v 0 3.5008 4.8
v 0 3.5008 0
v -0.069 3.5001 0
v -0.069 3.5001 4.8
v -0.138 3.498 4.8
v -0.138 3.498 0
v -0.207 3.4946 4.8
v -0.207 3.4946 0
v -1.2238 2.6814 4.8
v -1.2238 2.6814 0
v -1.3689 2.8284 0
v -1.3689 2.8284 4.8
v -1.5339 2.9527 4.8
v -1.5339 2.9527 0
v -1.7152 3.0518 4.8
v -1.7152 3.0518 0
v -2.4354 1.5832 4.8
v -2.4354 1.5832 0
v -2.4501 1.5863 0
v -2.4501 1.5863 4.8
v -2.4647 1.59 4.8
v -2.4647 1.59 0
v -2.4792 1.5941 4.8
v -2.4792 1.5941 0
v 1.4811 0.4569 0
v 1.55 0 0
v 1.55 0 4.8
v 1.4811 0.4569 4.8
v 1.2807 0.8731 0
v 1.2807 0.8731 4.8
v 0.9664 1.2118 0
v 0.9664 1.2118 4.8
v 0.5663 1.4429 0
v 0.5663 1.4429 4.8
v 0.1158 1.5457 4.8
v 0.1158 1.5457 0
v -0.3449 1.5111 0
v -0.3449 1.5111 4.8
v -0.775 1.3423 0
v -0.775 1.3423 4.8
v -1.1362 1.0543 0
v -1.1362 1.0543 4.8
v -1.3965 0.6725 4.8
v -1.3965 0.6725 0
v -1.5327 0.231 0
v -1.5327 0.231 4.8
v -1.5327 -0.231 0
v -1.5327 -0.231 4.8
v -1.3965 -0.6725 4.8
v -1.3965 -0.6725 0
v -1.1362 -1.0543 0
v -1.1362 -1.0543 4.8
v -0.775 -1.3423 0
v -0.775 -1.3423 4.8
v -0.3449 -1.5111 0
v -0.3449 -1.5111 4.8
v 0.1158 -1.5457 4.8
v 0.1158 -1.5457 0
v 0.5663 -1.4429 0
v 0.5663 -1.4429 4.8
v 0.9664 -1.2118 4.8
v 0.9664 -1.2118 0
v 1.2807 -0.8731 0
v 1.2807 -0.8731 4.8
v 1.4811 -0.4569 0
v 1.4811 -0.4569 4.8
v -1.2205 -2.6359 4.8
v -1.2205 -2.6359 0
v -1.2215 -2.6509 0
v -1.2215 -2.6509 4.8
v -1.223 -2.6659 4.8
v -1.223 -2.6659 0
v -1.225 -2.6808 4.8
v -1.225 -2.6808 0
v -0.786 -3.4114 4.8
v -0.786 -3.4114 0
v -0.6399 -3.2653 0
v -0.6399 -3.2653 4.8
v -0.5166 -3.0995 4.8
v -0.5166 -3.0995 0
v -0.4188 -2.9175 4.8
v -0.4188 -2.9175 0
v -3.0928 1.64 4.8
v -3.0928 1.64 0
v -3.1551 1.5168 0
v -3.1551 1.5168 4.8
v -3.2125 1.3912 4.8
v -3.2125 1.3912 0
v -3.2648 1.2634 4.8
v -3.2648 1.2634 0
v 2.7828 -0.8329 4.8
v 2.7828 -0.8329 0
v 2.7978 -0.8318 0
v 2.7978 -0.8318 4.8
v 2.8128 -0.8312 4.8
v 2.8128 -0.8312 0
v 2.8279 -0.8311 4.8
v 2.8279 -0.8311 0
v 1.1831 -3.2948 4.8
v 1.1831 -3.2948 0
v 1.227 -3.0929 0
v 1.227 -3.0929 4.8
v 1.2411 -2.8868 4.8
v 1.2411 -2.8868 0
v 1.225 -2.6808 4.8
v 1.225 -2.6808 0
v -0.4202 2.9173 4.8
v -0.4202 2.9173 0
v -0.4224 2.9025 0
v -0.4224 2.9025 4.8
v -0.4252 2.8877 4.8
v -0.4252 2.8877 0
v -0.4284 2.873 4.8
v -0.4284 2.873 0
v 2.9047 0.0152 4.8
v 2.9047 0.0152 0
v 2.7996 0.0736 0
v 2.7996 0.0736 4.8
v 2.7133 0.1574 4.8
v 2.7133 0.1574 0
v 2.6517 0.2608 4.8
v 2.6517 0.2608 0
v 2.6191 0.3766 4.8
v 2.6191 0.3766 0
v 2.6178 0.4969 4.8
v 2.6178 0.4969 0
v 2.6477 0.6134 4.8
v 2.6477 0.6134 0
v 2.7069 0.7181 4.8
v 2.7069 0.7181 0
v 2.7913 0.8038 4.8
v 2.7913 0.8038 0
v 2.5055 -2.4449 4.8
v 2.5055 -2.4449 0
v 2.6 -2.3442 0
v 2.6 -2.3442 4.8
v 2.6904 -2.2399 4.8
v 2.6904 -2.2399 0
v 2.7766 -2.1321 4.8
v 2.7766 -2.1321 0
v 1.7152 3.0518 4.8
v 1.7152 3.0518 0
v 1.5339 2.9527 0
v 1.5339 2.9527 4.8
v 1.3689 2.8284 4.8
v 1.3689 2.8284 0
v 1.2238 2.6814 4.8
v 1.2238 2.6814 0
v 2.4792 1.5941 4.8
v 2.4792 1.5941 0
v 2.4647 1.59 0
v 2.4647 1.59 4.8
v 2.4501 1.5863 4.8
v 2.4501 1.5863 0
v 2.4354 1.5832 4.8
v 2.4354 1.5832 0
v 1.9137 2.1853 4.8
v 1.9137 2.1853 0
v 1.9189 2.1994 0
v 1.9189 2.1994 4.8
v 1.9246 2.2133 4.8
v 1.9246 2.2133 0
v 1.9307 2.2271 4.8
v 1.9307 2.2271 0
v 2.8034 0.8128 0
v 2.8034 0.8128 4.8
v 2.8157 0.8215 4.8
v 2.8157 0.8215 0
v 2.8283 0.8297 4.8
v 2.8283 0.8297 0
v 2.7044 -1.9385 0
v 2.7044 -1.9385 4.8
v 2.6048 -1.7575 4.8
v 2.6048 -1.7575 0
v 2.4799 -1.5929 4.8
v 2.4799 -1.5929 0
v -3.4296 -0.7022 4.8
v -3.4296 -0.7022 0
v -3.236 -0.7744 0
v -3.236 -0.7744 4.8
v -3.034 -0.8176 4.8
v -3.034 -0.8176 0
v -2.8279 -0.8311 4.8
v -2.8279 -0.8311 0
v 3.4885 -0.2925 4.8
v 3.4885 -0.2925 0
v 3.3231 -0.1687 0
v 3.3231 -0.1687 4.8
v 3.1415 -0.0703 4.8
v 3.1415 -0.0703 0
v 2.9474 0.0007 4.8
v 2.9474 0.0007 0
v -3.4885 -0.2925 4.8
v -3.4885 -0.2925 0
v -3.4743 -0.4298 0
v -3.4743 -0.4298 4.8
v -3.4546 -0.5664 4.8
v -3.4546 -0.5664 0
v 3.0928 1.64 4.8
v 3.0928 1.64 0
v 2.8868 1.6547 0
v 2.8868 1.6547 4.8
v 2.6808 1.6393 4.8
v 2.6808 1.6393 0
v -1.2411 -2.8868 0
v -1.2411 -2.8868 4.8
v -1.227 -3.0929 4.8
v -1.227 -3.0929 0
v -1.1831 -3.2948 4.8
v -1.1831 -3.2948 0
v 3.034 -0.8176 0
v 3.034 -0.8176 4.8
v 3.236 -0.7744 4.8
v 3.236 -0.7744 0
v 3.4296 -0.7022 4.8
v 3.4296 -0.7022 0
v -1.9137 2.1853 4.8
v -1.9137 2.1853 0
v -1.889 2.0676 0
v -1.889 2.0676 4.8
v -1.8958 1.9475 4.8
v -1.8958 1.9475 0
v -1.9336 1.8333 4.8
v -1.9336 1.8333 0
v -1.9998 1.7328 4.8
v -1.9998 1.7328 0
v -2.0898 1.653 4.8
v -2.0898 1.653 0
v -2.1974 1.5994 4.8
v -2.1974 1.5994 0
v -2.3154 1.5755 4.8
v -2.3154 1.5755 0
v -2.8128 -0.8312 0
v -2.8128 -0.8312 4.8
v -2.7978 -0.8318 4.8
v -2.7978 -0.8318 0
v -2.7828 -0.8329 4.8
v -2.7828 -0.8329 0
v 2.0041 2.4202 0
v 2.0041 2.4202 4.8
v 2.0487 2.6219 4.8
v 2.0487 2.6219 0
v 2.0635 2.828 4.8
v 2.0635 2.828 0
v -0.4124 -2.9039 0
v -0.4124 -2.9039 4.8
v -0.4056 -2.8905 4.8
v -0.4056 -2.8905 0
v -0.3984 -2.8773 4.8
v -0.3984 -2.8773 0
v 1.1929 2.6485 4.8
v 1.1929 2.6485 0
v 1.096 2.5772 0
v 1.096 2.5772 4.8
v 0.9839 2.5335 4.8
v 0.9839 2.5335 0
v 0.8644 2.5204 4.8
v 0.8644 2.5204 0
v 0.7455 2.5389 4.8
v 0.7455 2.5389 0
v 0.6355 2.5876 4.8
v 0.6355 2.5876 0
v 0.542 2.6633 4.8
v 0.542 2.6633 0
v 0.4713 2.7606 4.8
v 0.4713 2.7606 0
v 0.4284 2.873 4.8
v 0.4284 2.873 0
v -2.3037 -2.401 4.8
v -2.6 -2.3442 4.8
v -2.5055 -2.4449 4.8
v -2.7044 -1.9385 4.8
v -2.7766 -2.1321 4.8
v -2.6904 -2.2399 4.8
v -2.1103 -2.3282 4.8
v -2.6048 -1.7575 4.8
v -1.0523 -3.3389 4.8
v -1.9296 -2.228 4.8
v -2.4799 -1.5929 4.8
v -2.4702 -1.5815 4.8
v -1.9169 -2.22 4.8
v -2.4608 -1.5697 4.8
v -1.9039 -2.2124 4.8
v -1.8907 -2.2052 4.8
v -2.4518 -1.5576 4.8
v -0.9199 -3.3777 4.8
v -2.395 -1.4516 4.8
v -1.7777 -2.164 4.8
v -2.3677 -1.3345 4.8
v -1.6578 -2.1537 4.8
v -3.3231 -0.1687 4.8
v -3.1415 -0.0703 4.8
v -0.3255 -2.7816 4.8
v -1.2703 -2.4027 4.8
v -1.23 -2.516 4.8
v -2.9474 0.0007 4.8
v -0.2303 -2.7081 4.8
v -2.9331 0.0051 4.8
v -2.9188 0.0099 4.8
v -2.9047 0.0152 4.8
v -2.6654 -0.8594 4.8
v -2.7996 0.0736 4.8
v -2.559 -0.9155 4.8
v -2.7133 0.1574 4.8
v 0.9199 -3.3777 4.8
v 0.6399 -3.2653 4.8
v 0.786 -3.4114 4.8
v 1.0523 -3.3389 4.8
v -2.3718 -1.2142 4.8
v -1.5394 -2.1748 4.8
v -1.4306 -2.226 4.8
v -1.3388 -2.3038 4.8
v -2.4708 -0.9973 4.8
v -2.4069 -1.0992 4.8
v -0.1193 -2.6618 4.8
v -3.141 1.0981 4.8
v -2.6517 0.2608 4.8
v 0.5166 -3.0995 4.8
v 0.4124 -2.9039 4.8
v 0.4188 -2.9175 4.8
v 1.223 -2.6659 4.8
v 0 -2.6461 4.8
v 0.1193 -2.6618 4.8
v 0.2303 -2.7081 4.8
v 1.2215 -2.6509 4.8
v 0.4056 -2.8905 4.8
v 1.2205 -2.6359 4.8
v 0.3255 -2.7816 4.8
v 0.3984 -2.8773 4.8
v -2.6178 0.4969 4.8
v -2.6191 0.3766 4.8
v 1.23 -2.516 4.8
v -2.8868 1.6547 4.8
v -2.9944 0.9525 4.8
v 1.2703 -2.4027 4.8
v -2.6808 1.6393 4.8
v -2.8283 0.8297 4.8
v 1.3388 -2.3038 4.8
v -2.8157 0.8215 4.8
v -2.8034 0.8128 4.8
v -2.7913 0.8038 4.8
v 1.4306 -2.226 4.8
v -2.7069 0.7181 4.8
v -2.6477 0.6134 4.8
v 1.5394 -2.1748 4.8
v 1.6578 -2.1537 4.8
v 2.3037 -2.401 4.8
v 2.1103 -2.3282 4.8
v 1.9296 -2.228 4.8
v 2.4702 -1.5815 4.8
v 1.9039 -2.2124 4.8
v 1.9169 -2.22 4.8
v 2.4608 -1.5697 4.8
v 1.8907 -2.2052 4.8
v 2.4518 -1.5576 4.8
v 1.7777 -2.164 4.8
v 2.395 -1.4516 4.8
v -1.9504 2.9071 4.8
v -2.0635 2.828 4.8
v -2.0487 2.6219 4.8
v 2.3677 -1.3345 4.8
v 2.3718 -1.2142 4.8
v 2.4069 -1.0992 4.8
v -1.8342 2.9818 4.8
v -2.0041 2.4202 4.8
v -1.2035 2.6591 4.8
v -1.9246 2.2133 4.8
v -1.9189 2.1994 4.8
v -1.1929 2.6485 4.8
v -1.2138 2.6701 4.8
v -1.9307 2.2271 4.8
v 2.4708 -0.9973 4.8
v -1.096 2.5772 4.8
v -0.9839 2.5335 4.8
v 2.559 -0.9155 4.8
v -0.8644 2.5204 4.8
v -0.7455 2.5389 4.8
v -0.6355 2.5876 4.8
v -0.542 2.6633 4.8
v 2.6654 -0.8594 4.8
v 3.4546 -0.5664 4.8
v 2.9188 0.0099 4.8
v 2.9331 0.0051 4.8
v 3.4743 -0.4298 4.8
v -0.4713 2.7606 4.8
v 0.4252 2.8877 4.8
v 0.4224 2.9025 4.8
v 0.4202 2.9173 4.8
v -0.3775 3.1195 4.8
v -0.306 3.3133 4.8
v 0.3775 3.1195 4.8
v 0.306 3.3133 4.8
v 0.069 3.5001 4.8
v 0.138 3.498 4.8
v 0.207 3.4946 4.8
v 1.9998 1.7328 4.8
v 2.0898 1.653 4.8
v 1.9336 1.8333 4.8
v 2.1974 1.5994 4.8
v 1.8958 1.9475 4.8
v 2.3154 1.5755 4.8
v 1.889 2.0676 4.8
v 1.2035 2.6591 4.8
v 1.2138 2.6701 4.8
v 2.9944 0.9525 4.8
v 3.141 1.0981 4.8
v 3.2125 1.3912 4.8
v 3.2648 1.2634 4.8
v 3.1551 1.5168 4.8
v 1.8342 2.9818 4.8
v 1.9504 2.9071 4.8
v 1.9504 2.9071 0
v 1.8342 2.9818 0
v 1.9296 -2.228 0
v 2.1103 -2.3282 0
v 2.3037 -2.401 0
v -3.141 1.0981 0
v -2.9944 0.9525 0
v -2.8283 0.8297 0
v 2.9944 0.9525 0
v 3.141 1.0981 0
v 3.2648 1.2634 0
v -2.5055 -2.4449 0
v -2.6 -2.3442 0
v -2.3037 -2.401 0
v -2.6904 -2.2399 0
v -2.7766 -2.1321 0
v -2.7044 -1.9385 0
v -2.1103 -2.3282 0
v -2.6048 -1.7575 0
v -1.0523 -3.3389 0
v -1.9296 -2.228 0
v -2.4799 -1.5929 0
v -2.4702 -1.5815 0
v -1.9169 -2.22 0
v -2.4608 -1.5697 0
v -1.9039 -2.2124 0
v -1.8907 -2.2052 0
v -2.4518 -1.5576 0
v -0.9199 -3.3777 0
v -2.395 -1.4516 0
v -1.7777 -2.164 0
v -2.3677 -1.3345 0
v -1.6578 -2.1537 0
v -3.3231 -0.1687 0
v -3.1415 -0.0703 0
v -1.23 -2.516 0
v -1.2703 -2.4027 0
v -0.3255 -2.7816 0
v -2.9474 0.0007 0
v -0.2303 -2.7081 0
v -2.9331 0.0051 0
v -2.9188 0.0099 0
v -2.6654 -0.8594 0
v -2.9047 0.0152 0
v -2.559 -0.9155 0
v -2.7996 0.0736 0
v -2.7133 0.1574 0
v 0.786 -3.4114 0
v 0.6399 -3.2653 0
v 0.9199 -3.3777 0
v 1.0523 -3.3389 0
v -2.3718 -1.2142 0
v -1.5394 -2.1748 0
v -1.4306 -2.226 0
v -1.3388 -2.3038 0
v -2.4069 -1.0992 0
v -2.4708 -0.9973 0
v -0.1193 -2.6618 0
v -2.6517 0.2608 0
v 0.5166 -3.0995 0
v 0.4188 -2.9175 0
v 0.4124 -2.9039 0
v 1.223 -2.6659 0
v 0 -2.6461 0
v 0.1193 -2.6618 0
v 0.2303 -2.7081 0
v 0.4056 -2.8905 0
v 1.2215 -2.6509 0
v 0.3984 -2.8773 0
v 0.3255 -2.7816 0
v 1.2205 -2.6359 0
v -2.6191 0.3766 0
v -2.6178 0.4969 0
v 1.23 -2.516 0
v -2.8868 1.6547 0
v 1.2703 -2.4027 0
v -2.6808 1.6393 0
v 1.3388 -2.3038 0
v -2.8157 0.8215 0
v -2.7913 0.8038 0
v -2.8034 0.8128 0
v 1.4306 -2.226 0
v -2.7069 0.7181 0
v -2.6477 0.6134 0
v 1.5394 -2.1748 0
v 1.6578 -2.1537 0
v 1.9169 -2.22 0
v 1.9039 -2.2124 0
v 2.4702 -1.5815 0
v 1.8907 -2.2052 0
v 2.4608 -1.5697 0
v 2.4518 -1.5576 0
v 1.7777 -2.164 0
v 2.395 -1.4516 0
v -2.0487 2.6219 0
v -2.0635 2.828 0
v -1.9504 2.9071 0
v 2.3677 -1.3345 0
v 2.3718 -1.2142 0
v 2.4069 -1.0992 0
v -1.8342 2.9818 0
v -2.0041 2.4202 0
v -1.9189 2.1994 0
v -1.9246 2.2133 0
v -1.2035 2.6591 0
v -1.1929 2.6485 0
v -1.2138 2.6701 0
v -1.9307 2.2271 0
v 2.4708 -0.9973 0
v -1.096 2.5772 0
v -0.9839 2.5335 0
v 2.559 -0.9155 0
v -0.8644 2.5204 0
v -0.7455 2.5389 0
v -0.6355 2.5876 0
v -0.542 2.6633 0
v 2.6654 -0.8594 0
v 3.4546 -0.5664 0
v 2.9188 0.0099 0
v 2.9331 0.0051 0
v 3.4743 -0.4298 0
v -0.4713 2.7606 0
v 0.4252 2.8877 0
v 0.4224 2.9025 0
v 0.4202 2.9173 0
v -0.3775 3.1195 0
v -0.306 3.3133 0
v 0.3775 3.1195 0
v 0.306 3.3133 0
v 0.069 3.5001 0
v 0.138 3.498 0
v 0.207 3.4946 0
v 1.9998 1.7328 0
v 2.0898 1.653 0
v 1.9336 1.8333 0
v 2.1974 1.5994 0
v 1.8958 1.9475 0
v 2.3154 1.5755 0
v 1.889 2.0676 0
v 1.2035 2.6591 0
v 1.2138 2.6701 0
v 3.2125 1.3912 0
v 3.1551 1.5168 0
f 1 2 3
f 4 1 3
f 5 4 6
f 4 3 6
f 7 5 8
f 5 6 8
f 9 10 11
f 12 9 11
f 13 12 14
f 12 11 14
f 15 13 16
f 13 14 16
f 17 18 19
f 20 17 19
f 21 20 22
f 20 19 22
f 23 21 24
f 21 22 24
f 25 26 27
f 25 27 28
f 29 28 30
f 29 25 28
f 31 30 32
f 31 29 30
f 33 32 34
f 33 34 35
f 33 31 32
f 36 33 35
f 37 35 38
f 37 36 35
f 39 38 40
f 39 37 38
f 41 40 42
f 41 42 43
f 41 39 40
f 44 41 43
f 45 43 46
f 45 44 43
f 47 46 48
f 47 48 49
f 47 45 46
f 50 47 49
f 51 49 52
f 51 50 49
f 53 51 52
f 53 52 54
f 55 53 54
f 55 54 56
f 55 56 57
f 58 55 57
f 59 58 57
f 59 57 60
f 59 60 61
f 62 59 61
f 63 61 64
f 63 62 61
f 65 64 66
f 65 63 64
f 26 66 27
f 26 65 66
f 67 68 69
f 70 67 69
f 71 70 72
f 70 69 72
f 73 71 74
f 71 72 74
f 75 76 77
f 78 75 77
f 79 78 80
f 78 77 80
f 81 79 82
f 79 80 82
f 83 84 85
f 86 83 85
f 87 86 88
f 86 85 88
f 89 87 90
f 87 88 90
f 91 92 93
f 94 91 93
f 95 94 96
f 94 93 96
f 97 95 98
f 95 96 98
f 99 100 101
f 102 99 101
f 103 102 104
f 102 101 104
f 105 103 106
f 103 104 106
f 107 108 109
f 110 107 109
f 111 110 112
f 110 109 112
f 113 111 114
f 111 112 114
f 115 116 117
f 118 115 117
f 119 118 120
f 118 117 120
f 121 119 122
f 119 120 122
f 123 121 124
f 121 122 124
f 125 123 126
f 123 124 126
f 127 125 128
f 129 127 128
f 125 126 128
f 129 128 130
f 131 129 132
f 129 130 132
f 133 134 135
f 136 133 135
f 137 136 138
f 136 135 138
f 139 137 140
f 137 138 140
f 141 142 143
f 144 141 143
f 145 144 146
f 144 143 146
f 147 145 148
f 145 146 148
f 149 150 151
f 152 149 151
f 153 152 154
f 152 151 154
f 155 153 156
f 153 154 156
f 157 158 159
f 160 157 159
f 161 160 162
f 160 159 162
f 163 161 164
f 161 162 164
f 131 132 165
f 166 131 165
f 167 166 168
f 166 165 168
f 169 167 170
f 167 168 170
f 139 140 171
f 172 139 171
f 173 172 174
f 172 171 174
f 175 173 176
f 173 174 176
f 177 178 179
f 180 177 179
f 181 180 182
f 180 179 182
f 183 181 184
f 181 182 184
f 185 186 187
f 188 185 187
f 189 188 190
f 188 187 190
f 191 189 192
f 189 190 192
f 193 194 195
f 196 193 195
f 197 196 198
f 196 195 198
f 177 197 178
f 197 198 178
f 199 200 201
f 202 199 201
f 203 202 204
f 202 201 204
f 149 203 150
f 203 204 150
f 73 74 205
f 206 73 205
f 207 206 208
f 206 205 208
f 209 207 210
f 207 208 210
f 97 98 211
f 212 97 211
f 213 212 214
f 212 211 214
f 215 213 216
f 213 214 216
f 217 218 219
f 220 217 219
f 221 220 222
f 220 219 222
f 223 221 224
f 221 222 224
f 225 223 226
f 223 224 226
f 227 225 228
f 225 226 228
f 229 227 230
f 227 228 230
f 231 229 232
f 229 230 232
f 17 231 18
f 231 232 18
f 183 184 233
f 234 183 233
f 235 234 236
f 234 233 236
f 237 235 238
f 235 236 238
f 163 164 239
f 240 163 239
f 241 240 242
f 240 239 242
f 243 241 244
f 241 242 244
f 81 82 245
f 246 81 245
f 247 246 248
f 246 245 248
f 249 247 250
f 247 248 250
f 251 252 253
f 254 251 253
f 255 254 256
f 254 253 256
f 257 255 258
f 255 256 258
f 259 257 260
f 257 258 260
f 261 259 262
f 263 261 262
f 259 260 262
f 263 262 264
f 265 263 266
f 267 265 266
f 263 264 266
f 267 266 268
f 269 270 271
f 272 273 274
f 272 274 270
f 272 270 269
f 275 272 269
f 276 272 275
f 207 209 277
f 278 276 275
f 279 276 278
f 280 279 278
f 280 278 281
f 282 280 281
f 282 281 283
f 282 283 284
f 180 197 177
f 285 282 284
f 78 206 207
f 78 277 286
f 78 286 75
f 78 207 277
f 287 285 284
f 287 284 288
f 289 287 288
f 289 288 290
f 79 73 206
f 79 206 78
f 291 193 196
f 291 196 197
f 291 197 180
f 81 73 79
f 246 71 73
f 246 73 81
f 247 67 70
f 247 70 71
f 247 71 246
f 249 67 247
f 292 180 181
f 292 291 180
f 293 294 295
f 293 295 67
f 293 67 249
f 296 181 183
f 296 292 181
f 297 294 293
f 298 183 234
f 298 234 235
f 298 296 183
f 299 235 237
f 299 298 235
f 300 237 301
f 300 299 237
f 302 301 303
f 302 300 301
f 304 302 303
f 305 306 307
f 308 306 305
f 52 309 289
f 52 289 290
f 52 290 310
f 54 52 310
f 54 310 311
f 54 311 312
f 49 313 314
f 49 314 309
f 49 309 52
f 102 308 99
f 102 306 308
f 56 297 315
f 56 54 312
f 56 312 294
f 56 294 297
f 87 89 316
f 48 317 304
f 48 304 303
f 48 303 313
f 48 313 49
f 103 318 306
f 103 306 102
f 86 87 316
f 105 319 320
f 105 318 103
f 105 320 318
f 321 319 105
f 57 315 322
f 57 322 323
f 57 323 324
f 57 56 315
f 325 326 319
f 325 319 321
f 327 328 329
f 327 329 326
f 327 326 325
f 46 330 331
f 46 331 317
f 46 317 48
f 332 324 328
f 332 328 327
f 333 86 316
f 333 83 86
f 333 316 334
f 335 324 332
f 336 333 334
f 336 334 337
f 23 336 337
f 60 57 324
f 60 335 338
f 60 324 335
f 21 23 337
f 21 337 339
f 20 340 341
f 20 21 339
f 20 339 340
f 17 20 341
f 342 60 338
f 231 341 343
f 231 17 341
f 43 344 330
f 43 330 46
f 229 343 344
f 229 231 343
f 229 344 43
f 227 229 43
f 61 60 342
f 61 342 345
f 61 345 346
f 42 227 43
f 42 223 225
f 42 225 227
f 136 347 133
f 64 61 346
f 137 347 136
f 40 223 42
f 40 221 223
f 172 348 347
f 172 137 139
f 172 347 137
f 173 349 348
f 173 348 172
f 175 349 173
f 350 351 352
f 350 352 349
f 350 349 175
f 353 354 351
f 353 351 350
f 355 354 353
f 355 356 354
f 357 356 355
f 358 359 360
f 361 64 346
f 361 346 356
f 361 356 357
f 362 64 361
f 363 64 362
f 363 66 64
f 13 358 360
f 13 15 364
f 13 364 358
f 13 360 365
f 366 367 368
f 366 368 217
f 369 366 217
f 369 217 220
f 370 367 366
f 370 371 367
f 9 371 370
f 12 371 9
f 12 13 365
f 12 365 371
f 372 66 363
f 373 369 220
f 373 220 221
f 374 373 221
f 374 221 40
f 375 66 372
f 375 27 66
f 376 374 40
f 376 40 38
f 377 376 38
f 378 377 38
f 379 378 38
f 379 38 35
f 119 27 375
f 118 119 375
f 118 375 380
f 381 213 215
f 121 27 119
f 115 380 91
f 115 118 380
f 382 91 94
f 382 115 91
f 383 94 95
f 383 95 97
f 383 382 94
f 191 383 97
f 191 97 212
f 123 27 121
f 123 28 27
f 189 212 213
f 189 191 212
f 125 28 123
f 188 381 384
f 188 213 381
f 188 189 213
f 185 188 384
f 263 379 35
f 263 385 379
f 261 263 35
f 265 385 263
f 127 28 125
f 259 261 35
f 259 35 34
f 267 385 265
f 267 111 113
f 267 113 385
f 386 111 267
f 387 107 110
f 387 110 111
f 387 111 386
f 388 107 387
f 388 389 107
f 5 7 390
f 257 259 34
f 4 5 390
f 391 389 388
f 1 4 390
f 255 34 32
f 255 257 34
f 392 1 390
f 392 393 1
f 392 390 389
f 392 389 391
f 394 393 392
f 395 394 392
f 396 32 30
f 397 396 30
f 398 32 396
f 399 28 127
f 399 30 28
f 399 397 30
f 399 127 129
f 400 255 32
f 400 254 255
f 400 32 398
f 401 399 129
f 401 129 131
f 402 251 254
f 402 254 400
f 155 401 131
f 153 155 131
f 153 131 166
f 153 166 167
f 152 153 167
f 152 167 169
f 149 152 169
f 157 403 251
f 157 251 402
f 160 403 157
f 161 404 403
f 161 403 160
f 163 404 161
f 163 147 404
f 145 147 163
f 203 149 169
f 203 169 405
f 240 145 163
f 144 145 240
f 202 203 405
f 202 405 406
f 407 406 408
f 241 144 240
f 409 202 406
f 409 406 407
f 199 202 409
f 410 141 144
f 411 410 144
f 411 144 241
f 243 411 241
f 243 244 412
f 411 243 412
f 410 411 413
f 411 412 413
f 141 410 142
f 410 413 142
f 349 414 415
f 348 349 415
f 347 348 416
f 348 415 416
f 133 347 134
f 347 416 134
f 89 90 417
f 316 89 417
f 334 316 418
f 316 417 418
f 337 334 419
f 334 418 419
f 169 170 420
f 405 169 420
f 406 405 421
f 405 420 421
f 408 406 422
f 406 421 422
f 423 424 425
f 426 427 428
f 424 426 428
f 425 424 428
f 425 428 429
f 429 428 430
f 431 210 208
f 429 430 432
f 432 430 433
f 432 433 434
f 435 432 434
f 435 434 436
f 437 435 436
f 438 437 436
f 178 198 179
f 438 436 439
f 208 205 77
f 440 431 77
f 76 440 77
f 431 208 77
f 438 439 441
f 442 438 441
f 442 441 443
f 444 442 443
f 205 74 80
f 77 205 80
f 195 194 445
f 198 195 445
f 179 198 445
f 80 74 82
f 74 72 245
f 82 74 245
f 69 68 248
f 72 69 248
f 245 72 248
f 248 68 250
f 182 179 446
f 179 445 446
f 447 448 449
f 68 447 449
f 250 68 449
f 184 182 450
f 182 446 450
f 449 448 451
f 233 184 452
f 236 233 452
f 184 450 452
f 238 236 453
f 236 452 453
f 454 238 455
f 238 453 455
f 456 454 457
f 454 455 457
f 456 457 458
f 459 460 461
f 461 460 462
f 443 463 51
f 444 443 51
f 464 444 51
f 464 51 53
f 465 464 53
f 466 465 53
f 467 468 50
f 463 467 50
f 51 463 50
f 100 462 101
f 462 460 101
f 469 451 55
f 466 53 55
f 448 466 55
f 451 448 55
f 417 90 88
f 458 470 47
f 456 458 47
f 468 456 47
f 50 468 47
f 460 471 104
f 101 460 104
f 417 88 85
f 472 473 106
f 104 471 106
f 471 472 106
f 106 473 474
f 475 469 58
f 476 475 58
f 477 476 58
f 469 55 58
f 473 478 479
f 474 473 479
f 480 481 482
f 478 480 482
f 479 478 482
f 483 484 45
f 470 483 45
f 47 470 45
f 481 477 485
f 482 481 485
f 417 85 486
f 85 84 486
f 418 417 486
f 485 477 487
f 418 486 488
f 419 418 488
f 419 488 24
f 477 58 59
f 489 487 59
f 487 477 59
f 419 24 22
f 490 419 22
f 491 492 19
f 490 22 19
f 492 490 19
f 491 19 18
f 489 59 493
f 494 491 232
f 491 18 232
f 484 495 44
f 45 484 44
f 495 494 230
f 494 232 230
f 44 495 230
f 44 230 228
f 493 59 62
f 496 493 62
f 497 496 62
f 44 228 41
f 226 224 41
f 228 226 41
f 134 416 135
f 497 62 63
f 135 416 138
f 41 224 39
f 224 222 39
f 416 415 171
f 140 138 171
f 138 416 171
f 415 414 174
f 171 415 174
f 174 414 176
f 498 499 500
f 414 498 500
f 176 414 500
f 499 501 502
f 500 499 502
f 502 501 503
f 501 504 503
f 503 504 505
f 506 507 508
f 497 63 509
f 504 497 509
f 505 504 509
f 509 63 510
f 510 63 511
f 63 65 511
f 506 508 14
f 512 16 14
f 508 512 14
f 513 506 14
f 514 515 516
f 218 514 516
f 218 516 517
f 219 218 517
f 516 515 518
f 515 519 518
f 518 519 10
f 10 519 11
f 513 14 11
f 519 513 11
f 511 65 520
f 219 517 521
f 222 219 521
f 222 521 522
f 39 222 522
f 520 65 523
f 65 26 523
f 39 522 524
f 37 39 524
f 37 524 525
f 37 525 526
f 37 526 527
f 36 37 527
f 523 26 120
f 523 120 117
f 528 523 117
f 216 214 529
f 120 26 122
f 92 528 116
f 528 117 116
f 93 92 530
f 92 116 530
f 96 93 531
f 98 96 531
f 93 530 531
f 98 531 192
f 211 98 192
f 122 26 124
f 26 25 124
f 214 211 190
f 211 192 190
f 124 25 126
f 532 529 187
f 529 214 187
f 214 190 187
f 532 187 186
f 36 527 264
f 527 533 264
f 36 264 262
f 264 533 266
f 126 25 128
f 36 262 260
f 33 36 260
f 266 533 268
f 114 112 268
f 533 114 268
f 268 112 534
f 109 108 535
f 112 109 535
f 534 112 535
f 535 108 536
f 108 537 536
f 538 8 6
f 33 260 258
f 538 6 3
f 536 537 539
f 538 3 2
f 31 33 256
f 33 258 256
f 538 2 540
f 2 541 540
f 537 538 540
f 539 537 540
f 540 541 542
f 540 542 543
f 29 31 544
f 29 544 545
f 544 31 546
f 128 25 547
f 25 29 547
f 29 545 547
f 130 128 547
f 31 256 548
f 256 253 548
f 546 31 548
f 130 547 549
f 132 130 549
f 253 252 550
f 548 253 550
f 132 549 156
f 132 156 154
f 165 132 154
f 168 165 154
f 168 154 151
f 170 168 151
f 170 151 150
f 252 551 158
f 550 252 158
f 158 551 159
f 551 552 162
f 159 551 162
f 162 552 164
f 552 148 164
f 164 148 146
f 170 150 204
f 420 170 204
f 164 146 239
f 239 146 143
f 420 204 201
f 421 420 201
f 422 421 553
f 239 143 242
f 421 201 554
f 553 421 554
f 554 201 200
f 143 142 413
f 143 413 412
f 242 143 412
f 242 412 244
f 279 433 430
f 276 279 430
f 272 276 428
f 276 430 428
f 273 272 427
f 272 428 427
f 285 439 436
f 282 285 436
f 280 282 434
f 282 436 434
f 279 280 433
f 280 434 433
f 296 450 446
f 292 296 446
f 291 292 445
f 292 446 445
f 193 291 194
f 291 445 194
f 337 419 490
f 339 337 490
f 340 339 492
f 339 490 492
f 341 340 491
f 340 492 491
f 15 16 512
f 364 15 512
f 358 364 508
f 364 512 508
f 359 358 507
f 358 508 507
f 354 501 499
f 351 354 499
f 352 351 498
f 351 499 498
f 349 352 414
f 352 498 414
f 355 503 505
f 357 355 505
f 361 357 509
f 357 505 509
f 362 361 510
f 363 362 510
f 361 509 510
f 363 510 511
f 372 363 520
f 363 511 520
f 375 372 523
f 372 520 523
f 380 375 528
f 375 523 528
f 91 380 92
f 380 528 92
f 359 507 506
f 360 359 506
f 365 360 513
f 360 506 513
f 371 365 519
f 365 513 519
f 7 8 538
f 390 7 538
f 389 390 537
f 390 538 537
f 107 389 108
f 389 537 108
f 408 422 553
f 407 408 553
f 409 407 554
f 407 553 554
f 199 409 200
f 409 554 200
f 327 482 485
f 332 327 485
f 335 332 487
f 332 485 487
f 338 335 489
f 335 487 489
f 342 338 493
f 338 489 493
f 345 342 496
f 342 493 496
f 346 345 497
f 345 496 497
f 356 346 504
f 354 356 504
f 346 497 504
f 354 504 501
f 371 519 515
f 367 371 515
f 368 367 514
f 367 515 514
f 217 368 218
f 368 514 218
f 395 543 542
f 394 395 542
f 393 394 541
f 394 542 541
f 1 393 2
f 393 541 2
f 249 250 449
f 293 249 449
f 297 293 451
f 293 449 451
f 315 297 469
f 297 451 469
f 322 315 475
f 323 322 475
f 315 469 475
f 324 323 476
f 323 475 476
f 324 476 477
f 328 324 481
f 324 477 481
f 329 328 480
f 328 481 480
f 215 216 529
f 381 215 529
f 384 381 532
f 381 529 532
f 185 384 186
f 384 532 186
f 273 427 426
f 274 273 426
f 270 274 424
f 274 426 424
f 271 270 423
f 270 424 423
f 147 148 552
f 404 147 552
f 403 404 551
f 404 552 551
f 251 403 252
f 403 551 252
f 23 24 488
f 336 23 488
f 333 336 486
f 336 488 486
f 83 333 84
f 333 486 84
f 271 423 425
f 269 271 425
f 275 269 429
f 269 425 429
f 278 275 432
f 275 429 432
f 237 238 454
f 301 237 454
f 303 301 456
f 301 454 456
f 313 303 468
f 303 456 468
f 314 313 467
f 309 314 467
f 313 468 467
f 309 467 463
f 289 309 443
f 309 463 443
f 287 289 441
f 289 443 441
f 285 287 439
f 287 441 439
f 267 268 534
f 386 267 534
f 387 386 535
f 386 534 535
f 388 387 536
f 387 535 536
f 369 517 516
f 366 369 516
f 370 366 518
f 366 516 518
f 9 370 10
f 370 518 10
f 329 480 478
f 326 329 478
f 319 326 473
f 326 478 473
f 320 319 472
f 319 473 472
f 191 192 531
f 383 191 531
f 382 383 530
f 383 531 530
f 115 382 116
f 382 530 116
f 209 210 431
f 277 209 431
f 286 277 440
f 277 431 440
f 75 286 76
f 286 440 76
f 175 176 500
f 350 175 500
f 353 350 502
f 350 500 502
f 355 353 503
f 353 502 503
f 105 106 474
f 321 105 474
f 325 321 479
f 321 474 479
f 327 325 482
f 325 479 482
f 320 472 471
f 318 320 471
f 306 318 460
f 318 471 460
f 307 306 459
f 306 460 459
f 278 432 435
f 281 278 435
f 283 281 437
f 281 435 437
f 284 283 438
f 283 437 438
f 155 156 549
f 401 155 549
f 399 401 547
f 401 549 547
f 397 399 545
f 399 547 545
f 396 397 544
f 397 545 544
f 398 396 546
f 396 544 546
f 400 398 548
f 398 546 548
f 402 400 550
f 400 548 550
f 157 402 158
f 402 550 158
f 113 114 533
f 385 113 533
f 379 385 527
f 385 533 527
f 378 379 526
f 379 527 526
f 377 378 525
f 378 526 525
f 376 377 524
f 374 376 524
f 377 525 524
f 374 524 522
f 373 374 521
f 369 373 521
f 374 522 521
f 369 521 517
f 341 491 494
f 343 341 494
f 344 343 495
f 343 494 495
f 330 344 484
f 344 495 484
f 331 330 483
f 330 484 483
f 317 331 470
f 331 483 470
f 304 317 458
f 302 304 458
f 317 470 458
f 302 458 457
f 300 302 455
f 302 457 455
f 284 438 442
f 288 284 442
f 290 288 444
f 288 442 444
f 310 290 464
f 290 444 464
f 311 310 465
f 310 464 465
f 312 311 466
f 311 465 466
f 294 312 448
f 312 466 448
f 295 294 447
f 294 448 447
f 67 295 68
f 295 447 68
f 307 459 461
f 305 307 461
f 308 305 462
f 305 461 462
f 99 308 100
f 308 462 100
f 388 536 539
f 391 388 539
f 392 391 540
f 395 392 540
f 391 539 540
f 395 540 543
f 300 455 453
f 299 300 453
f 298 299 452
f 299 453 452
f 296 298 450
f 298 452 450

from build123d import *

# Parameters (mm, degrees)
SKETCH1_R           = 1.55
BOSS_EXTRUDE1_DEPTH = 4.8


with BuildPart() as part:
    # Sketch1 → Boss-Extrude1 (new body)
    with BuildSketch(Plane.XY):
        with BuildLine():
            ThreePointArc((-1.220475879, -2.635924597), (-1.222210326, -2.658421079), (-1.225048855, -2.680805064))
            ThreePointArc((-1.225048855, -2.680805064), (-1.237827813, -2.990086384), (-1.183146697, -3.294763611))
            ThreePointArc((-1.183146697, -3.294763611), (-0.986277373, -3.358952263), (-0.785957353, -3.411388925))
            ThreePointArc((-0.785957353, -3.411388925), (-0.575235727, -3.184640974), (-0.418775964, -2.917548145))
            ThreePointArc((-0.418775964, -2.917548145), (-0.409062191, -2.897182914), (-0.398358784, -2.877319956))
            ThreePointArc((-0.398358784, -2.877319956), (0, -2.646063949), (0.398358784, -2.877319957))
            ThreePointArc((0.398358784, -2.877319957), (0.409062191, -2.897182914), (0.418775964, -2.917548145))
            ThreePointArc((0.418775964, -2.917548145), (0.575235727, -3.184640974), (0.785957353, -3.411388925))
            ThreePointArc((0.785957353, -3.411388925), (0.986277373, -3.358952263), (1.183146697, -3.294763611))
            ThreePointArc((1.183146697, -3.294763611), (1.237827812, -2.990086385), (1.225048855, -2.680805065))
            ThreePointArc((1.225048855, -2.680805065), (1.222210326, -2.65842108), (1.220475879, -2.635924598))
            ThreePointArc((1.220475879, -2.635924598), (1.430570178, -2.226010644), (1.890717351, -2.205186558))
            ThreePointArc((1.890717351, -2.205186558), (1.910460355, -2.216109643), (1.929642376, -2.227990303))
            ThreePointArc((1.929642376, -2.227990303), (2.205665989, -2.368094556), (2.505525497, -2.444922359))
            ThreePointArc((2.505525497, -2.444922359), (2.645696022, -2.292508653), (2.776610031, -2.13207413))
            ThreePointArc((2.776610031, -2.13207413), (2.657889767, -1.846200494), (2.479929318, -1.592925316))
            ThreePointArc((2.479929318, -1.592925316), (2.4654397, -1.575629335), (2.451818074, -1.557641803))
            ThreePointArc((2.451818074, -1.557641803), (2.40694443, -1.09921469), (2.782786513, -0.832922011))
            ThreePointArc((2.782786513, -0.832922011), (2.80530085, -0.831437221), (2.827860963, -0.831061285))
            ThreePointArc((2.827860963, -0.831061285), (3.135812881, -0.79969485), (3.429606999, -0.702210219))
            ThreePointArc((3.429606999, -0.702210219), (3.465124877, -0.498209743), (3.488519299, -0.292466177))
            ThreePointArc((3.488519299, -0.292466177), (3.234090501, -0.116158991), (2.947449745, 0.000696964))
            ThreePointArc((2.947449745, 0.000696964), (2.925909389, 0.00741359), (2.904725354, 0.015181258))
            ThreePointArc((2.904725354, 0.015181258), (2.619130834, 0.376574163), (2.791340622, 0.80378939))
            ThreePointArc((2.791340622, 0.80378939), (2.80947815, 0.817210645), (2.828253678, 0.829723821))
            ThreePointArc((2.828253678, 0.829723821), (3.070361342, 1.022602322), (3.264812511, 1.263448704))
            ThreePointArc((3.264812511, 1.263448704), (3.184401067, 1.454267239), (3.092848337, 1.63999772))
            ThreePointArc((3.092848337, 1.63999772), (2.783490351, 1.65076217), (2.479175704, 1.594097963))
            ThreePointArc((2.479175704, 1.594097963), (2.457423521, 1.588102753), (2.435402858, 1.583184377))
            ThreePointArc((2.435402858, 1.583184377), (1.999761704, 1.73280338), (1.913663807, 2.18530334))
            ThreePointArc((1.913663807, 2.18530334), (1.921665988, 2.206399906), (1.930695833, 2.227077476))
            ThreePointArc((1.930695833, 2.227077476), (2.030091771, 2.520230481), (2.063463119, 2.82797159))
            ThreePointArc((2.063463119, 2.82797159), (1.892652419, 2.945024649), (1.715219882, 3.051773929))
            ThreePointArc((1.715219882, 3.051773929), (1.449151682, 2.893578006), (1.223780893, 2.681384122))
            ThreePointArc((1.223780893, 2.681384122), (1.208723048, 2.664580512), (1.192857163, 2.648537642))
            ThreePointArc((1.192857163, 2.648537642), (0.745482362, 2.538879767), (0.428412254, 2.87299892))
            ThreePointArc((0.428412254, 2.87299892), (0.423738452, 2.895072786), (0.420155704, 2.917349768))
            ThreePointArc((0.420155704, 2.917349768), (0.345282406, 3.217703271), (0.206978766, 3.494633479))
            ThreePointArc((0.206978766, 3.494633479), (0.103534673, 3.499226191), (0, 3.500757541))
            ThreePointArc((0, 3.500757541), (-0.103534673, 3.499226191), (-0.206978766, 3.494633479))
            ThreePointArc((-0.206978766, 3.494633479), (-0.345282406, 3.217703271), (-0.420155704, 2.917349768))
            ThreePointArc((-0.420155704, 2.917349768), (-0.423738452, 2.895072786), (-0.428412254, 2.87299892))
            ThreePointArc((-0.428412254, 2.87299892), (-0.745482362, 2.538879767), (-1.192857163, 2.648537642))
            ThreePointArc((-1.192857163, 2.648537642), (-1.208723048, 2.664580512), (-1.223780893, 2.681384122))
            ThreePointArc((-1.223780893, 2.681384122), (-1.449151682, 2.893578006), (-1.715219882, 3.051773929))
            ThreePointArc((-1.715219882, 3.051773929), (-1.892652419, 2.945024649), (-2.063463119, 2.82797159))
            ThreePointArc((-2.063463119, 2.82797159), (-2.030091771, 2.520230481), (-1.930695833, 2.227077476))
            ThreePointArc((-1.930695833, 2.227077476), (-1.921665988, 2.206399906), (-1.913663807, 2.18530334))
            ThreePointArc((-1.913663807, 2.18530334), (-1.999761704, 1.73280338), (-2.435402858, 1.583184377))
            ThreePointArc((-2.435402858, 1.583184377), (-2.457423521, 1.588102753), (-2.479175704, 1.594097963))
            ThreePointArc((-2.479175704, 1.594097963), (-2.783490351, 1.65076217), (-3.092848337, 1.63999772))
            ThreePointArc((-3.092848337, 1.63999772), (-3.184401067, 1.454267239), (-3.264812511, 1.263448704))
            ThreePointArc((-3.264812511, 1.263448704), (-3.070361342, 1.022602322), (-2.828253678, 0.829723821))
            ThreePointArc((-2.828253678, 0.829723821), (-2.80947815, 0.817210645), (-2.791340622, 0.80378939))
            ThreePointArc((-2.791340622, 0.80378939), (-2.619130834, 0.376574163), (-2.904725354, 0.015181258))
            ThreePointArc((-2.904725354, 0.015181258), (-2.925909389, 0.00741359), (-2.947449745, 0.000696964))
            ThreePointArc((-2.947449745, 0.000696964), (-3.234090501, -0.116158991), (-3.488519299, -0.292466177))
            ThreePointArc((-3.488519299, -0.292466177), (-3.465124877, -0.498209743), (-3.429606999, -0.702210219))
            ThreePointArc((-3.429606999, -0.702210219), (-3.135812881, -0.79969485), (-2.827860963, -0.831061285))
            ThreePointArc((-2.827860963, -0.831061285), (-2.80530085, -0.831437221), (-2.782786513, -0.832922011))
            ThreePointArc((-2.782786513, -0.832922011), (-2.40694443, -1.09921469), (-2.451818074, -1.557641803))
            ThreePointArc((-2.451818074, -1.557641803), (-2.4654397, -1.575629335), (-2.479929318, -1.592925316))
            ThreePointArc((-2.479929318, -1.592925316), (-2.657889767, -1.846200494), (-2.776610031, -2.13207413))
            ThreePointArc((-2.776610031, -2.13207413), (-2.645696022, -2.292508653), (-2.505525497, -2.444922359))
            ThreePointArc((-2.505525497, -2.444922359), (-2.205665987, -2.368094557), (-1.929642373, -2.227990304))
            ThreePointArc((-1.929642373, -2.227990304), (-1.910460352, -2.216109645), (-1.890717348, -2.20518656))
            ThreePointArc((-1.890717348, -2.20518656), (-1.430570177, -2.226010646), (-1.220475879, -2.635924597))
        make_face()
        Circle(SKETCH1_R, mode=Mode.SUBTRACT)
    extrude(amount=BOSS_EXTRUDE1_DEPTH)


solid = part.part
